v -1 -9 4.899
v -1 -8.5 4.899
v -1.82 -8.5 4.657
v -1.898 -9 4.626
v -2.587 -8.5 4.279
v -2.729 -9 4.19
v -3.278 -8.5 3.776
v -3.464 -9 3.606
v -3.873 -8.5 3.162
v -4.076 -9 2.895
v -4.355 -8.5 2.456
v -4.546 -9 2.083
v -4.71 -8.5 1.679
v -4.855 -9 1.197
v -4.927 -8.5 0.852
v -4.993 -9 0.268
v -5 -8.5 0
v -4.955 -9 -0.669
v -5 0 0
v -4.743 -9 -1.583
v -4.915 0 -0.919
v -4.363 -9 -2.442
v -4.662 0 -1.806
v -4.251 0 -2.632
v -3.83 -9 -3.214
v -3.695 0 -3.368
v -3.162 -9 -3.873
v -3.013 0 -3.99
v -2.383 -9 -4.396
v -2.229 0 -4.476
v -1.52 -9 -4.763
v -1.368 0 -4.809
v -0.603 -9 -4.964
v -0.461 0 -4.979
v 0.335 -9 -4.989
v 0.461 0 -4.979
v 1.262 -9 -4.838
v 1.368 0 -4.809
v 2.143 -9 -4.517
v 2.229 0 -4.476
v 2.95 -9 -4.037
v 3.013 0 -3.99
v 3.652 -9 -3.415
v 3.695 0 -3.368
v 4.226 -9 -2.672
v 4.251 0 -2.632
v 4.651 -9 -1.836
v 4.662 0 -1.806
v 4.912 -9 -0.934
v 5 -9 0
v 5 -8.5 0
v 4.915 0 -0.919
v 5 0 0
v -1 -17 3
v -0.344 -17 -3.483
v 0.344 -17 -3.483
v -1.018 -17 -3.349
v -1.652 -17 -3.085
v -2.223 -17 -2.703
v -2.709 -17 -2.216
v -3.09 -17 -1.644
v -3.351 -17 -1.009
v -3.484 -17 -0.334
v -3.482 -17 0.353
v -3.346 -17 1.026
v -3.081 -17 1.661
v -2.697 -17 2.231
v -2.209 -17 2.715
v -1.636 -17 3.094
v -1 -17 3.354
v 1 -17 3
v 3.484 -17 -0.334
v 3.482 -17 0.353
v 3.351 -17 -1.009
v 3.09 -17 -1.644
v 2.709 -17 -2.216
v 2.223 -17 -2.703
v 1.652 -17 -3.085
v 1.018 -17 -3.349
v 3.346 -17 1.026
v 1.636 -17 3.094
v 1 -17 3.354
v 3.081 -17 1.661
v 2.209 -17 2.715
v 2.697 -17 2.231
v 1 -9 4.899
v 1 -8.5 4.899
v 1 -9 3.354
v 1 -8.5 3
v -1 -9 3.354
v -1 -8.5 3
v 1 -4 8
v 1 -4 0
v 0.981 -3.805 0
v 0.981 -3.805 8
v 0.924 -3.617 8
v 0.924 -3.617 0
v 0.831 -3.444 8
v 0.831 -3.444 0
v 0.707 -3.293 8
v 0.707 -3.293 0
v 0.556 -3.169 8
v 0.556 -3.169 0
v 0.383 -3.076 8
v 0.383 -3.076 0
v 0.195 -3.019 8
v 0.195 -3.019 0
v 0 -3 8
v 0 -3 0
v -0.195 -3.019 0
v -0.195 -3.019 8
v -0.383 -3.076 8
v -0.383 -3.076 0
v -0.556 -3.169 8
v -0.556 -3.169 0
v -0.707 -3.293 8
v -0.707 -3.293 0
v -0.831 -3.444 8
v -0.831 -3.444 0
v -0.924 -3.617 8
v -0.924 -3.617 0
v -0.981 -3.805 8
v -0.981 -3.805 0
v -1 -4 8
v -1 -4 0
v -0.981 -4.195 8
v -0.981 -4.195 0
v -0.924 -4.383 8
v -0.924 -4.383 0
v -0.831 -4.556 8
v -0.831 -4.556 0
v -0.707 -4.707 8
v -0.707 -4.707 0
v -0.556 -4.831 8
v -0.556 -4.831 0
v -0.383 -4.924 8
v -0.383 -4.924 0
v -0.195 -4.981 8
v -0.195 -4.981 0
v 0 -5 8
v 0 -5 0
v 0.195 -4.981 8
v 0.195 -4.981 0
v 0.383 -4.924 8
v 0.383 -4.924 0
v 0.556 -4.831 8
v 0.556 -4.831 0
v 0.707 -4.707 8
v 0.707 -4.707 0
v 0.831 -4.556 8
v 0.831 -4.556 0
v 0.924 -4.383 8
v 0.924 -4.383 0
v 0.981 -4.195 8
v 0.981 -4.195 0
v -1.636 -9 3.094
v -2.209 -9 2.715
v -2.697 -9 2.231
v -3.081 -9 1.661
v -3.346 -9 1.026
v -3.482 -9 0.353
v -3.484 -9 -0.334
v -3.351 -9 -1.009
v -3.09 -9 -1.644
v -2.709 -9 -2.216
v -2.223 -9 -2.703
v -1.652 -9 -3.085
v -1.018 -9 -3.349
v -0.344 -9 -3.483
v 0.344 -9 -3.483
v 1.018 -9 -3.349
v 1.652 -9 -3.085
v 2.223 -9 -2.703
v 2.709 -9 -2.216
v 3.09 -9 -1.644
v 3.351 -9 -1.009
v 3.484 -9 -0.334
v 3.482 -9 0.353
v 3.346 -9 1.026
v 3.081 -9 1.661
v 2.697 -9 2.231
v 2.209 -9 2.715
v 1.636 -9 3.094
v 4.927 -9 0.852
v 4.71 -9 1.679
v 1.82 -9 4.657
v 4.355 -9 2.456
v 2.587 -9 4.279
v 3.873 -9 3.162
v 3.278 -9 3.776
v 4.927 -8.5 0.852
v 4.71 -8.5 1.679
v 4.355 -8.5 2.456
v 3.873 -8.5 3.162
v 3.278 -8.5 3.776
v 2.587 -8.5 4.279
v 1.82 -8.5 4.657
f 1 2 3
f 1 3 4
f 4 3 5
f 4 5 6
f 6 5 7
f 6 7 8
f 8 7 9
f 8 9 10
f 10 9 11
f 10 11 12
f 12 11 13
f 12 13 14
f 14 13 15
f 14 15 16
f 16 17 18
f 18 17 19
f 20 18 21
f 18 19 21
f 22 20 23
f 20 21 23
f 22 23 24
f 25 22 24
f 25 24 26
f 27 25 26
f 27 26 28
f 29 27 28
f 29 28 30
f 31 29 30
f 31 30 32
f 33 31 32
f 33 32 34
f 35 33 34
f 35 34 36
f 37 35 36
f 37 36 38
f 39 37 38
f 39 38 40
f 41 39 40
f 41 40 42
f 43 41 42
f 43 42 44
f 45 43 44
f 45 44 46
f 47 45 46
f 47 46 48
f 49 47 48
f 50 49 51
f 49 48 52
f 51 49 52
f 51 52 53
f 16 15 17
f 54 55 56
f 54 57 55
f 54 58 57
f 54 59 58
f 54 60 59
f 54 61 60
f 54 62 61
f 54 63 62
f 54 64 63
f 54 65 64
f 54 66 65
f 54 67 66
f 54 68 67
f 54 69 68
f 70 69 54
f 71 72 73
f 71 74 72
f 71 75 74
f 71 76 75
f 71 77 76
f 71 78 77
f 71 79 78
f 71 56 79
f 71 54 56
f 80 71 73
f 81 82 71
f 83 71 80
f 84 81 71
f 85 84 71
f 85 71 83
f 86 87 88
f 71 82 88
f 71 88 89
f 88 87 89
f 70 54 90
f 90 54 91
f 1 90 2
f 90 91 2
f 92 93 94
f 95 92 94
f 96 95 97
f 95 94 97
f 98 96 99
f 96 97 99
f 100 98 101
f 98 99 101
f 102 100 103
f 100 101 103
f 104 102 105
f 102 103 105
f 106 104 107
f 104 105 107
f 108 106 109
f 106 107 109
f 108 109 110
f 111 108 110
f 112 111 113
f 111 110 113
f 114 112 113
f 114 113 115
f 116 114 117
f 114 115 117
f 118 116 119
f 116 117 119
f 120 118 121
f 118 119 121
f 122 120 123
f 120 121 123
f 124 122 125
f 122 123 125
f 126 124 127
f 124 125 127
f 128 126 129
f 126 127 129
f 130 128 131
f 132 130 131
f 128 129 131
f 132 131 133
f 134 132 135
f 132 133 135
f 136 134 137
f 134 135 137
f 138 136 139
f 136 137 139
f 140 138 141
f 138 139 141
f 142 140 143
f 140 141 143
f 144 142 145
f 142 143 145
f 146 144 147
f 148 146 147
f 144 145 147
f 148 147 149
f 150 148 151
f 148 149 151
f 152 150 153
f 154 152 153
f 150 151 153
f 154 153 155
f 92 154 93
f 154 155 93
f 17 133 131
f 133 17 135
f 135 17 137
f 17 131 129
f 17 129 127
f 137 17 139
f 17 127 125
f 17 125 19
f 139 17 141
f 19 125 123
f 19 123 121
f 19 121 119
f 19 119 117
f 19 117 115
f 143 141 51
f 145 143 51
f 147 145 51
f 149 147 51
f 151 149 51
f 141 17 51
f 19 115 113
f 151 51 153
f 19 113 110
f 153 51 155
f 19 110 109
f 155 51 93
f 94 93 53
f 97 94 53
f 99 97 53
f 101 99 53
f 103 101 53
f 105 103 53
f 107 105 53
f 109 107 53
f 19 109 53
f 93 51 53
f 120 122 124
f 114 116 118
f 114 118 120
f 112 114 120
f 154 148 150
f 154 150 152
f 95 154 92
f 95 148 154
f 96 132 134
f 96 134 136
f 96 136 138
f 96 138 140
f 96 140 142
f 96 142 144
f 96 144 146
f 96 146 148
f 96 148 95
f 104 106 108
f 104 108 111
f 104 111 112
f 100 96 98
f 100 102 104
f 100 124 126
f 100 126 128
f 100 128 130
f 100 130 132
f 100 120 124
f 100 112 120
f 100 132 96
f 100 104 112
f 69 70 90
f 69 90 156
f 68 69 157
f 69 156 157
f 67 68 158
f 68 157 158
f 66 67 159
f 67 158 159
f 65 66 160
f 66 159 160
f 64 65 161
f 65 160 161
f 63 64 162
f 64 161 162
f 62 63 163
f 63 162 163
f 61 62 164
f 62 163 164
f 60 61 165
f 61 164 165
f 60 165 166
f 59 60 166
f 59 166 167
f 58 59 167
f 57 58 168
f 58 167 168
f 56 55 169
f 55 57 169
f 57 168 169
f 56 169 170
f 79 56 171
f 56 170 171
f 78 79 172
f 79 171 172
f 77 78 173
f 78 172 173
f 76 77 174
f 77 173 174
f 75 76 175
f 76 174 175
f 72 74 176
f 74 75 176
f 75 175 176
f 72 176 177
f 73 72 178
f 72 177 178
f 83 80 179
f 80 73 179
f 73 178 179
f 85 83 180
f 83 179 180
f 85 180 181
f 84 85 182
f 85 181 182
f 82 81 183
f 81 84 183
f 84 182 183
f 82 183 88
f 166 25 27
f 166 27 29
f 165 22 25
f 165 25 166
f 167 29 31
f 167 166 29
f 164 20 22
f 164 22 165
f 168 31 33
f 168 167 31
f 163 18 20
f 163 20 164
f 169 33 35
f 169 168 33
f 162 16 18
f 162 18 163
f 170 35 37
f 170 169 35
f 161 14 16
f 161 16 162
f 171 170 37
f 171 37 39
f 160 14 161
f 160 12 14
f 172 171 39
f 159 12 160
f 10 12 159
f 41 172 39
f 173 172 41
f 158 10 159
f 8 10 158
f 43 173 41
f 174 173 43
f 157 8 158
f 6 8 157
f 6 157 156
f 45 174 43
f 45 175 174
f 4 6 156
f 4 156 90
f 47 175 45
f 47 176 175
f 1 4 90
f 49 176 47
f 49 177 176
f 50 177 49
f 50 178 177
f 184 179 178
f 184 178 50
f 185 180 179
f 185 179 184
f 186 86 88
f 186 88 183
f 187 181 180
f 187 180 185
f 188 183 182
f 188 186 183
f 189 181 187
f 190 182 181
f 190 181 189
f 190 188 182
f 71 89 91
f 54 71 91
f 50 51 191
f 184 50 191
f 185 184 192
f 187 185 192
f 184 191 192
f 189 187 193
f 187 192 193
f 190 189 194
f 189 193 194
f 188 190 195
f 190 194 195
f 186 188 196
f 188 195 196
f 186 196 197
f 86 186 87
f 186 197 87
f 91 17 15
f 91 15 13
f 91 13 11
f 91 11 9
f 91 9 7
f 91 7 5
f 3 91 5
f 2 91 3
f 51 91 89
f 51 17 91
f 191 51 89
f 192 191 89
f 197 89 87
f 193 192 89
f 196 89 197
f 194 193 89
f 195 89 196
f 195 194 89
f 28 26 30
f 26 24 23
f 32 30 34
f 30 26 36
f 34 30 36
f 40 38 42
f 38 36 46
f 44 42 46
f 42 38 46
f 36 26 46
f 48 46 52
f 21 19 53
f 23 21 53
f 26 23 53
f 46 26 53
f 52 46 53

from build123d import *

# Parameters (mm, degrees)
F0_R     = 5
F1_DEPTH = 9
F2_R     = 3.5
F3_DEPTH = 8
F4_W     = 9.3990088471
F4_H     = 6
F5_DEPTH = 12.5
F7_DEPTH = 25
F8_R     = 1
F9_DEPTH = 8


with BuildPart() as f1:
    # F0 (on Front) → F1 (new body)
    with BuildSketch(Plane.XZ):
        Circle(F0_R)
    extrude(amount=F1_DEPTH)

    # F2 (on face) → F3 (join)
    with BuildSketch(Plane.XZ.offset(9)):
        Circle(F2_R)
    extrude(amount=F3_DEPTH)

    # F4 (on Right) → F5 (cut, symmetric)
    with BuildSketch(Plane.YZ):
        with Locations((-3.8004955764, 3)):
            Rectangle(F4_W, F4_H)
    extrude(amount=F5_DEPTH, both=True, mode=Mode.SUBTRACT)

    # F6 (on face) → F7 (cut)
    with BuildSketch(Plane(origin=(0, -8.5, 0), x_dir=(-1, 0, 0), z_dir=(0, 1, 0))):
        with BuildLine():
            Line((-1, 3), (1, 3))
            Line((1, 3), (1, 4.8989794856))
            ThreePointArc((1, 4.8989794856), (0, 5), (-1, 4.8989794856))
            Line((-1, 4.8989794856), (-1, 3))
        make_face()
    extrude(amount=-F7_DEPTH, mode=Mode.SUBTRACT)

    # F8 (on face) → F9 (join)
    with BuildSketch(Plane.XY):
        with Locations((0, -4)):
            Circle(F8_R)
    extrude(amount=F9_DEPTH)


solid = f1.part
